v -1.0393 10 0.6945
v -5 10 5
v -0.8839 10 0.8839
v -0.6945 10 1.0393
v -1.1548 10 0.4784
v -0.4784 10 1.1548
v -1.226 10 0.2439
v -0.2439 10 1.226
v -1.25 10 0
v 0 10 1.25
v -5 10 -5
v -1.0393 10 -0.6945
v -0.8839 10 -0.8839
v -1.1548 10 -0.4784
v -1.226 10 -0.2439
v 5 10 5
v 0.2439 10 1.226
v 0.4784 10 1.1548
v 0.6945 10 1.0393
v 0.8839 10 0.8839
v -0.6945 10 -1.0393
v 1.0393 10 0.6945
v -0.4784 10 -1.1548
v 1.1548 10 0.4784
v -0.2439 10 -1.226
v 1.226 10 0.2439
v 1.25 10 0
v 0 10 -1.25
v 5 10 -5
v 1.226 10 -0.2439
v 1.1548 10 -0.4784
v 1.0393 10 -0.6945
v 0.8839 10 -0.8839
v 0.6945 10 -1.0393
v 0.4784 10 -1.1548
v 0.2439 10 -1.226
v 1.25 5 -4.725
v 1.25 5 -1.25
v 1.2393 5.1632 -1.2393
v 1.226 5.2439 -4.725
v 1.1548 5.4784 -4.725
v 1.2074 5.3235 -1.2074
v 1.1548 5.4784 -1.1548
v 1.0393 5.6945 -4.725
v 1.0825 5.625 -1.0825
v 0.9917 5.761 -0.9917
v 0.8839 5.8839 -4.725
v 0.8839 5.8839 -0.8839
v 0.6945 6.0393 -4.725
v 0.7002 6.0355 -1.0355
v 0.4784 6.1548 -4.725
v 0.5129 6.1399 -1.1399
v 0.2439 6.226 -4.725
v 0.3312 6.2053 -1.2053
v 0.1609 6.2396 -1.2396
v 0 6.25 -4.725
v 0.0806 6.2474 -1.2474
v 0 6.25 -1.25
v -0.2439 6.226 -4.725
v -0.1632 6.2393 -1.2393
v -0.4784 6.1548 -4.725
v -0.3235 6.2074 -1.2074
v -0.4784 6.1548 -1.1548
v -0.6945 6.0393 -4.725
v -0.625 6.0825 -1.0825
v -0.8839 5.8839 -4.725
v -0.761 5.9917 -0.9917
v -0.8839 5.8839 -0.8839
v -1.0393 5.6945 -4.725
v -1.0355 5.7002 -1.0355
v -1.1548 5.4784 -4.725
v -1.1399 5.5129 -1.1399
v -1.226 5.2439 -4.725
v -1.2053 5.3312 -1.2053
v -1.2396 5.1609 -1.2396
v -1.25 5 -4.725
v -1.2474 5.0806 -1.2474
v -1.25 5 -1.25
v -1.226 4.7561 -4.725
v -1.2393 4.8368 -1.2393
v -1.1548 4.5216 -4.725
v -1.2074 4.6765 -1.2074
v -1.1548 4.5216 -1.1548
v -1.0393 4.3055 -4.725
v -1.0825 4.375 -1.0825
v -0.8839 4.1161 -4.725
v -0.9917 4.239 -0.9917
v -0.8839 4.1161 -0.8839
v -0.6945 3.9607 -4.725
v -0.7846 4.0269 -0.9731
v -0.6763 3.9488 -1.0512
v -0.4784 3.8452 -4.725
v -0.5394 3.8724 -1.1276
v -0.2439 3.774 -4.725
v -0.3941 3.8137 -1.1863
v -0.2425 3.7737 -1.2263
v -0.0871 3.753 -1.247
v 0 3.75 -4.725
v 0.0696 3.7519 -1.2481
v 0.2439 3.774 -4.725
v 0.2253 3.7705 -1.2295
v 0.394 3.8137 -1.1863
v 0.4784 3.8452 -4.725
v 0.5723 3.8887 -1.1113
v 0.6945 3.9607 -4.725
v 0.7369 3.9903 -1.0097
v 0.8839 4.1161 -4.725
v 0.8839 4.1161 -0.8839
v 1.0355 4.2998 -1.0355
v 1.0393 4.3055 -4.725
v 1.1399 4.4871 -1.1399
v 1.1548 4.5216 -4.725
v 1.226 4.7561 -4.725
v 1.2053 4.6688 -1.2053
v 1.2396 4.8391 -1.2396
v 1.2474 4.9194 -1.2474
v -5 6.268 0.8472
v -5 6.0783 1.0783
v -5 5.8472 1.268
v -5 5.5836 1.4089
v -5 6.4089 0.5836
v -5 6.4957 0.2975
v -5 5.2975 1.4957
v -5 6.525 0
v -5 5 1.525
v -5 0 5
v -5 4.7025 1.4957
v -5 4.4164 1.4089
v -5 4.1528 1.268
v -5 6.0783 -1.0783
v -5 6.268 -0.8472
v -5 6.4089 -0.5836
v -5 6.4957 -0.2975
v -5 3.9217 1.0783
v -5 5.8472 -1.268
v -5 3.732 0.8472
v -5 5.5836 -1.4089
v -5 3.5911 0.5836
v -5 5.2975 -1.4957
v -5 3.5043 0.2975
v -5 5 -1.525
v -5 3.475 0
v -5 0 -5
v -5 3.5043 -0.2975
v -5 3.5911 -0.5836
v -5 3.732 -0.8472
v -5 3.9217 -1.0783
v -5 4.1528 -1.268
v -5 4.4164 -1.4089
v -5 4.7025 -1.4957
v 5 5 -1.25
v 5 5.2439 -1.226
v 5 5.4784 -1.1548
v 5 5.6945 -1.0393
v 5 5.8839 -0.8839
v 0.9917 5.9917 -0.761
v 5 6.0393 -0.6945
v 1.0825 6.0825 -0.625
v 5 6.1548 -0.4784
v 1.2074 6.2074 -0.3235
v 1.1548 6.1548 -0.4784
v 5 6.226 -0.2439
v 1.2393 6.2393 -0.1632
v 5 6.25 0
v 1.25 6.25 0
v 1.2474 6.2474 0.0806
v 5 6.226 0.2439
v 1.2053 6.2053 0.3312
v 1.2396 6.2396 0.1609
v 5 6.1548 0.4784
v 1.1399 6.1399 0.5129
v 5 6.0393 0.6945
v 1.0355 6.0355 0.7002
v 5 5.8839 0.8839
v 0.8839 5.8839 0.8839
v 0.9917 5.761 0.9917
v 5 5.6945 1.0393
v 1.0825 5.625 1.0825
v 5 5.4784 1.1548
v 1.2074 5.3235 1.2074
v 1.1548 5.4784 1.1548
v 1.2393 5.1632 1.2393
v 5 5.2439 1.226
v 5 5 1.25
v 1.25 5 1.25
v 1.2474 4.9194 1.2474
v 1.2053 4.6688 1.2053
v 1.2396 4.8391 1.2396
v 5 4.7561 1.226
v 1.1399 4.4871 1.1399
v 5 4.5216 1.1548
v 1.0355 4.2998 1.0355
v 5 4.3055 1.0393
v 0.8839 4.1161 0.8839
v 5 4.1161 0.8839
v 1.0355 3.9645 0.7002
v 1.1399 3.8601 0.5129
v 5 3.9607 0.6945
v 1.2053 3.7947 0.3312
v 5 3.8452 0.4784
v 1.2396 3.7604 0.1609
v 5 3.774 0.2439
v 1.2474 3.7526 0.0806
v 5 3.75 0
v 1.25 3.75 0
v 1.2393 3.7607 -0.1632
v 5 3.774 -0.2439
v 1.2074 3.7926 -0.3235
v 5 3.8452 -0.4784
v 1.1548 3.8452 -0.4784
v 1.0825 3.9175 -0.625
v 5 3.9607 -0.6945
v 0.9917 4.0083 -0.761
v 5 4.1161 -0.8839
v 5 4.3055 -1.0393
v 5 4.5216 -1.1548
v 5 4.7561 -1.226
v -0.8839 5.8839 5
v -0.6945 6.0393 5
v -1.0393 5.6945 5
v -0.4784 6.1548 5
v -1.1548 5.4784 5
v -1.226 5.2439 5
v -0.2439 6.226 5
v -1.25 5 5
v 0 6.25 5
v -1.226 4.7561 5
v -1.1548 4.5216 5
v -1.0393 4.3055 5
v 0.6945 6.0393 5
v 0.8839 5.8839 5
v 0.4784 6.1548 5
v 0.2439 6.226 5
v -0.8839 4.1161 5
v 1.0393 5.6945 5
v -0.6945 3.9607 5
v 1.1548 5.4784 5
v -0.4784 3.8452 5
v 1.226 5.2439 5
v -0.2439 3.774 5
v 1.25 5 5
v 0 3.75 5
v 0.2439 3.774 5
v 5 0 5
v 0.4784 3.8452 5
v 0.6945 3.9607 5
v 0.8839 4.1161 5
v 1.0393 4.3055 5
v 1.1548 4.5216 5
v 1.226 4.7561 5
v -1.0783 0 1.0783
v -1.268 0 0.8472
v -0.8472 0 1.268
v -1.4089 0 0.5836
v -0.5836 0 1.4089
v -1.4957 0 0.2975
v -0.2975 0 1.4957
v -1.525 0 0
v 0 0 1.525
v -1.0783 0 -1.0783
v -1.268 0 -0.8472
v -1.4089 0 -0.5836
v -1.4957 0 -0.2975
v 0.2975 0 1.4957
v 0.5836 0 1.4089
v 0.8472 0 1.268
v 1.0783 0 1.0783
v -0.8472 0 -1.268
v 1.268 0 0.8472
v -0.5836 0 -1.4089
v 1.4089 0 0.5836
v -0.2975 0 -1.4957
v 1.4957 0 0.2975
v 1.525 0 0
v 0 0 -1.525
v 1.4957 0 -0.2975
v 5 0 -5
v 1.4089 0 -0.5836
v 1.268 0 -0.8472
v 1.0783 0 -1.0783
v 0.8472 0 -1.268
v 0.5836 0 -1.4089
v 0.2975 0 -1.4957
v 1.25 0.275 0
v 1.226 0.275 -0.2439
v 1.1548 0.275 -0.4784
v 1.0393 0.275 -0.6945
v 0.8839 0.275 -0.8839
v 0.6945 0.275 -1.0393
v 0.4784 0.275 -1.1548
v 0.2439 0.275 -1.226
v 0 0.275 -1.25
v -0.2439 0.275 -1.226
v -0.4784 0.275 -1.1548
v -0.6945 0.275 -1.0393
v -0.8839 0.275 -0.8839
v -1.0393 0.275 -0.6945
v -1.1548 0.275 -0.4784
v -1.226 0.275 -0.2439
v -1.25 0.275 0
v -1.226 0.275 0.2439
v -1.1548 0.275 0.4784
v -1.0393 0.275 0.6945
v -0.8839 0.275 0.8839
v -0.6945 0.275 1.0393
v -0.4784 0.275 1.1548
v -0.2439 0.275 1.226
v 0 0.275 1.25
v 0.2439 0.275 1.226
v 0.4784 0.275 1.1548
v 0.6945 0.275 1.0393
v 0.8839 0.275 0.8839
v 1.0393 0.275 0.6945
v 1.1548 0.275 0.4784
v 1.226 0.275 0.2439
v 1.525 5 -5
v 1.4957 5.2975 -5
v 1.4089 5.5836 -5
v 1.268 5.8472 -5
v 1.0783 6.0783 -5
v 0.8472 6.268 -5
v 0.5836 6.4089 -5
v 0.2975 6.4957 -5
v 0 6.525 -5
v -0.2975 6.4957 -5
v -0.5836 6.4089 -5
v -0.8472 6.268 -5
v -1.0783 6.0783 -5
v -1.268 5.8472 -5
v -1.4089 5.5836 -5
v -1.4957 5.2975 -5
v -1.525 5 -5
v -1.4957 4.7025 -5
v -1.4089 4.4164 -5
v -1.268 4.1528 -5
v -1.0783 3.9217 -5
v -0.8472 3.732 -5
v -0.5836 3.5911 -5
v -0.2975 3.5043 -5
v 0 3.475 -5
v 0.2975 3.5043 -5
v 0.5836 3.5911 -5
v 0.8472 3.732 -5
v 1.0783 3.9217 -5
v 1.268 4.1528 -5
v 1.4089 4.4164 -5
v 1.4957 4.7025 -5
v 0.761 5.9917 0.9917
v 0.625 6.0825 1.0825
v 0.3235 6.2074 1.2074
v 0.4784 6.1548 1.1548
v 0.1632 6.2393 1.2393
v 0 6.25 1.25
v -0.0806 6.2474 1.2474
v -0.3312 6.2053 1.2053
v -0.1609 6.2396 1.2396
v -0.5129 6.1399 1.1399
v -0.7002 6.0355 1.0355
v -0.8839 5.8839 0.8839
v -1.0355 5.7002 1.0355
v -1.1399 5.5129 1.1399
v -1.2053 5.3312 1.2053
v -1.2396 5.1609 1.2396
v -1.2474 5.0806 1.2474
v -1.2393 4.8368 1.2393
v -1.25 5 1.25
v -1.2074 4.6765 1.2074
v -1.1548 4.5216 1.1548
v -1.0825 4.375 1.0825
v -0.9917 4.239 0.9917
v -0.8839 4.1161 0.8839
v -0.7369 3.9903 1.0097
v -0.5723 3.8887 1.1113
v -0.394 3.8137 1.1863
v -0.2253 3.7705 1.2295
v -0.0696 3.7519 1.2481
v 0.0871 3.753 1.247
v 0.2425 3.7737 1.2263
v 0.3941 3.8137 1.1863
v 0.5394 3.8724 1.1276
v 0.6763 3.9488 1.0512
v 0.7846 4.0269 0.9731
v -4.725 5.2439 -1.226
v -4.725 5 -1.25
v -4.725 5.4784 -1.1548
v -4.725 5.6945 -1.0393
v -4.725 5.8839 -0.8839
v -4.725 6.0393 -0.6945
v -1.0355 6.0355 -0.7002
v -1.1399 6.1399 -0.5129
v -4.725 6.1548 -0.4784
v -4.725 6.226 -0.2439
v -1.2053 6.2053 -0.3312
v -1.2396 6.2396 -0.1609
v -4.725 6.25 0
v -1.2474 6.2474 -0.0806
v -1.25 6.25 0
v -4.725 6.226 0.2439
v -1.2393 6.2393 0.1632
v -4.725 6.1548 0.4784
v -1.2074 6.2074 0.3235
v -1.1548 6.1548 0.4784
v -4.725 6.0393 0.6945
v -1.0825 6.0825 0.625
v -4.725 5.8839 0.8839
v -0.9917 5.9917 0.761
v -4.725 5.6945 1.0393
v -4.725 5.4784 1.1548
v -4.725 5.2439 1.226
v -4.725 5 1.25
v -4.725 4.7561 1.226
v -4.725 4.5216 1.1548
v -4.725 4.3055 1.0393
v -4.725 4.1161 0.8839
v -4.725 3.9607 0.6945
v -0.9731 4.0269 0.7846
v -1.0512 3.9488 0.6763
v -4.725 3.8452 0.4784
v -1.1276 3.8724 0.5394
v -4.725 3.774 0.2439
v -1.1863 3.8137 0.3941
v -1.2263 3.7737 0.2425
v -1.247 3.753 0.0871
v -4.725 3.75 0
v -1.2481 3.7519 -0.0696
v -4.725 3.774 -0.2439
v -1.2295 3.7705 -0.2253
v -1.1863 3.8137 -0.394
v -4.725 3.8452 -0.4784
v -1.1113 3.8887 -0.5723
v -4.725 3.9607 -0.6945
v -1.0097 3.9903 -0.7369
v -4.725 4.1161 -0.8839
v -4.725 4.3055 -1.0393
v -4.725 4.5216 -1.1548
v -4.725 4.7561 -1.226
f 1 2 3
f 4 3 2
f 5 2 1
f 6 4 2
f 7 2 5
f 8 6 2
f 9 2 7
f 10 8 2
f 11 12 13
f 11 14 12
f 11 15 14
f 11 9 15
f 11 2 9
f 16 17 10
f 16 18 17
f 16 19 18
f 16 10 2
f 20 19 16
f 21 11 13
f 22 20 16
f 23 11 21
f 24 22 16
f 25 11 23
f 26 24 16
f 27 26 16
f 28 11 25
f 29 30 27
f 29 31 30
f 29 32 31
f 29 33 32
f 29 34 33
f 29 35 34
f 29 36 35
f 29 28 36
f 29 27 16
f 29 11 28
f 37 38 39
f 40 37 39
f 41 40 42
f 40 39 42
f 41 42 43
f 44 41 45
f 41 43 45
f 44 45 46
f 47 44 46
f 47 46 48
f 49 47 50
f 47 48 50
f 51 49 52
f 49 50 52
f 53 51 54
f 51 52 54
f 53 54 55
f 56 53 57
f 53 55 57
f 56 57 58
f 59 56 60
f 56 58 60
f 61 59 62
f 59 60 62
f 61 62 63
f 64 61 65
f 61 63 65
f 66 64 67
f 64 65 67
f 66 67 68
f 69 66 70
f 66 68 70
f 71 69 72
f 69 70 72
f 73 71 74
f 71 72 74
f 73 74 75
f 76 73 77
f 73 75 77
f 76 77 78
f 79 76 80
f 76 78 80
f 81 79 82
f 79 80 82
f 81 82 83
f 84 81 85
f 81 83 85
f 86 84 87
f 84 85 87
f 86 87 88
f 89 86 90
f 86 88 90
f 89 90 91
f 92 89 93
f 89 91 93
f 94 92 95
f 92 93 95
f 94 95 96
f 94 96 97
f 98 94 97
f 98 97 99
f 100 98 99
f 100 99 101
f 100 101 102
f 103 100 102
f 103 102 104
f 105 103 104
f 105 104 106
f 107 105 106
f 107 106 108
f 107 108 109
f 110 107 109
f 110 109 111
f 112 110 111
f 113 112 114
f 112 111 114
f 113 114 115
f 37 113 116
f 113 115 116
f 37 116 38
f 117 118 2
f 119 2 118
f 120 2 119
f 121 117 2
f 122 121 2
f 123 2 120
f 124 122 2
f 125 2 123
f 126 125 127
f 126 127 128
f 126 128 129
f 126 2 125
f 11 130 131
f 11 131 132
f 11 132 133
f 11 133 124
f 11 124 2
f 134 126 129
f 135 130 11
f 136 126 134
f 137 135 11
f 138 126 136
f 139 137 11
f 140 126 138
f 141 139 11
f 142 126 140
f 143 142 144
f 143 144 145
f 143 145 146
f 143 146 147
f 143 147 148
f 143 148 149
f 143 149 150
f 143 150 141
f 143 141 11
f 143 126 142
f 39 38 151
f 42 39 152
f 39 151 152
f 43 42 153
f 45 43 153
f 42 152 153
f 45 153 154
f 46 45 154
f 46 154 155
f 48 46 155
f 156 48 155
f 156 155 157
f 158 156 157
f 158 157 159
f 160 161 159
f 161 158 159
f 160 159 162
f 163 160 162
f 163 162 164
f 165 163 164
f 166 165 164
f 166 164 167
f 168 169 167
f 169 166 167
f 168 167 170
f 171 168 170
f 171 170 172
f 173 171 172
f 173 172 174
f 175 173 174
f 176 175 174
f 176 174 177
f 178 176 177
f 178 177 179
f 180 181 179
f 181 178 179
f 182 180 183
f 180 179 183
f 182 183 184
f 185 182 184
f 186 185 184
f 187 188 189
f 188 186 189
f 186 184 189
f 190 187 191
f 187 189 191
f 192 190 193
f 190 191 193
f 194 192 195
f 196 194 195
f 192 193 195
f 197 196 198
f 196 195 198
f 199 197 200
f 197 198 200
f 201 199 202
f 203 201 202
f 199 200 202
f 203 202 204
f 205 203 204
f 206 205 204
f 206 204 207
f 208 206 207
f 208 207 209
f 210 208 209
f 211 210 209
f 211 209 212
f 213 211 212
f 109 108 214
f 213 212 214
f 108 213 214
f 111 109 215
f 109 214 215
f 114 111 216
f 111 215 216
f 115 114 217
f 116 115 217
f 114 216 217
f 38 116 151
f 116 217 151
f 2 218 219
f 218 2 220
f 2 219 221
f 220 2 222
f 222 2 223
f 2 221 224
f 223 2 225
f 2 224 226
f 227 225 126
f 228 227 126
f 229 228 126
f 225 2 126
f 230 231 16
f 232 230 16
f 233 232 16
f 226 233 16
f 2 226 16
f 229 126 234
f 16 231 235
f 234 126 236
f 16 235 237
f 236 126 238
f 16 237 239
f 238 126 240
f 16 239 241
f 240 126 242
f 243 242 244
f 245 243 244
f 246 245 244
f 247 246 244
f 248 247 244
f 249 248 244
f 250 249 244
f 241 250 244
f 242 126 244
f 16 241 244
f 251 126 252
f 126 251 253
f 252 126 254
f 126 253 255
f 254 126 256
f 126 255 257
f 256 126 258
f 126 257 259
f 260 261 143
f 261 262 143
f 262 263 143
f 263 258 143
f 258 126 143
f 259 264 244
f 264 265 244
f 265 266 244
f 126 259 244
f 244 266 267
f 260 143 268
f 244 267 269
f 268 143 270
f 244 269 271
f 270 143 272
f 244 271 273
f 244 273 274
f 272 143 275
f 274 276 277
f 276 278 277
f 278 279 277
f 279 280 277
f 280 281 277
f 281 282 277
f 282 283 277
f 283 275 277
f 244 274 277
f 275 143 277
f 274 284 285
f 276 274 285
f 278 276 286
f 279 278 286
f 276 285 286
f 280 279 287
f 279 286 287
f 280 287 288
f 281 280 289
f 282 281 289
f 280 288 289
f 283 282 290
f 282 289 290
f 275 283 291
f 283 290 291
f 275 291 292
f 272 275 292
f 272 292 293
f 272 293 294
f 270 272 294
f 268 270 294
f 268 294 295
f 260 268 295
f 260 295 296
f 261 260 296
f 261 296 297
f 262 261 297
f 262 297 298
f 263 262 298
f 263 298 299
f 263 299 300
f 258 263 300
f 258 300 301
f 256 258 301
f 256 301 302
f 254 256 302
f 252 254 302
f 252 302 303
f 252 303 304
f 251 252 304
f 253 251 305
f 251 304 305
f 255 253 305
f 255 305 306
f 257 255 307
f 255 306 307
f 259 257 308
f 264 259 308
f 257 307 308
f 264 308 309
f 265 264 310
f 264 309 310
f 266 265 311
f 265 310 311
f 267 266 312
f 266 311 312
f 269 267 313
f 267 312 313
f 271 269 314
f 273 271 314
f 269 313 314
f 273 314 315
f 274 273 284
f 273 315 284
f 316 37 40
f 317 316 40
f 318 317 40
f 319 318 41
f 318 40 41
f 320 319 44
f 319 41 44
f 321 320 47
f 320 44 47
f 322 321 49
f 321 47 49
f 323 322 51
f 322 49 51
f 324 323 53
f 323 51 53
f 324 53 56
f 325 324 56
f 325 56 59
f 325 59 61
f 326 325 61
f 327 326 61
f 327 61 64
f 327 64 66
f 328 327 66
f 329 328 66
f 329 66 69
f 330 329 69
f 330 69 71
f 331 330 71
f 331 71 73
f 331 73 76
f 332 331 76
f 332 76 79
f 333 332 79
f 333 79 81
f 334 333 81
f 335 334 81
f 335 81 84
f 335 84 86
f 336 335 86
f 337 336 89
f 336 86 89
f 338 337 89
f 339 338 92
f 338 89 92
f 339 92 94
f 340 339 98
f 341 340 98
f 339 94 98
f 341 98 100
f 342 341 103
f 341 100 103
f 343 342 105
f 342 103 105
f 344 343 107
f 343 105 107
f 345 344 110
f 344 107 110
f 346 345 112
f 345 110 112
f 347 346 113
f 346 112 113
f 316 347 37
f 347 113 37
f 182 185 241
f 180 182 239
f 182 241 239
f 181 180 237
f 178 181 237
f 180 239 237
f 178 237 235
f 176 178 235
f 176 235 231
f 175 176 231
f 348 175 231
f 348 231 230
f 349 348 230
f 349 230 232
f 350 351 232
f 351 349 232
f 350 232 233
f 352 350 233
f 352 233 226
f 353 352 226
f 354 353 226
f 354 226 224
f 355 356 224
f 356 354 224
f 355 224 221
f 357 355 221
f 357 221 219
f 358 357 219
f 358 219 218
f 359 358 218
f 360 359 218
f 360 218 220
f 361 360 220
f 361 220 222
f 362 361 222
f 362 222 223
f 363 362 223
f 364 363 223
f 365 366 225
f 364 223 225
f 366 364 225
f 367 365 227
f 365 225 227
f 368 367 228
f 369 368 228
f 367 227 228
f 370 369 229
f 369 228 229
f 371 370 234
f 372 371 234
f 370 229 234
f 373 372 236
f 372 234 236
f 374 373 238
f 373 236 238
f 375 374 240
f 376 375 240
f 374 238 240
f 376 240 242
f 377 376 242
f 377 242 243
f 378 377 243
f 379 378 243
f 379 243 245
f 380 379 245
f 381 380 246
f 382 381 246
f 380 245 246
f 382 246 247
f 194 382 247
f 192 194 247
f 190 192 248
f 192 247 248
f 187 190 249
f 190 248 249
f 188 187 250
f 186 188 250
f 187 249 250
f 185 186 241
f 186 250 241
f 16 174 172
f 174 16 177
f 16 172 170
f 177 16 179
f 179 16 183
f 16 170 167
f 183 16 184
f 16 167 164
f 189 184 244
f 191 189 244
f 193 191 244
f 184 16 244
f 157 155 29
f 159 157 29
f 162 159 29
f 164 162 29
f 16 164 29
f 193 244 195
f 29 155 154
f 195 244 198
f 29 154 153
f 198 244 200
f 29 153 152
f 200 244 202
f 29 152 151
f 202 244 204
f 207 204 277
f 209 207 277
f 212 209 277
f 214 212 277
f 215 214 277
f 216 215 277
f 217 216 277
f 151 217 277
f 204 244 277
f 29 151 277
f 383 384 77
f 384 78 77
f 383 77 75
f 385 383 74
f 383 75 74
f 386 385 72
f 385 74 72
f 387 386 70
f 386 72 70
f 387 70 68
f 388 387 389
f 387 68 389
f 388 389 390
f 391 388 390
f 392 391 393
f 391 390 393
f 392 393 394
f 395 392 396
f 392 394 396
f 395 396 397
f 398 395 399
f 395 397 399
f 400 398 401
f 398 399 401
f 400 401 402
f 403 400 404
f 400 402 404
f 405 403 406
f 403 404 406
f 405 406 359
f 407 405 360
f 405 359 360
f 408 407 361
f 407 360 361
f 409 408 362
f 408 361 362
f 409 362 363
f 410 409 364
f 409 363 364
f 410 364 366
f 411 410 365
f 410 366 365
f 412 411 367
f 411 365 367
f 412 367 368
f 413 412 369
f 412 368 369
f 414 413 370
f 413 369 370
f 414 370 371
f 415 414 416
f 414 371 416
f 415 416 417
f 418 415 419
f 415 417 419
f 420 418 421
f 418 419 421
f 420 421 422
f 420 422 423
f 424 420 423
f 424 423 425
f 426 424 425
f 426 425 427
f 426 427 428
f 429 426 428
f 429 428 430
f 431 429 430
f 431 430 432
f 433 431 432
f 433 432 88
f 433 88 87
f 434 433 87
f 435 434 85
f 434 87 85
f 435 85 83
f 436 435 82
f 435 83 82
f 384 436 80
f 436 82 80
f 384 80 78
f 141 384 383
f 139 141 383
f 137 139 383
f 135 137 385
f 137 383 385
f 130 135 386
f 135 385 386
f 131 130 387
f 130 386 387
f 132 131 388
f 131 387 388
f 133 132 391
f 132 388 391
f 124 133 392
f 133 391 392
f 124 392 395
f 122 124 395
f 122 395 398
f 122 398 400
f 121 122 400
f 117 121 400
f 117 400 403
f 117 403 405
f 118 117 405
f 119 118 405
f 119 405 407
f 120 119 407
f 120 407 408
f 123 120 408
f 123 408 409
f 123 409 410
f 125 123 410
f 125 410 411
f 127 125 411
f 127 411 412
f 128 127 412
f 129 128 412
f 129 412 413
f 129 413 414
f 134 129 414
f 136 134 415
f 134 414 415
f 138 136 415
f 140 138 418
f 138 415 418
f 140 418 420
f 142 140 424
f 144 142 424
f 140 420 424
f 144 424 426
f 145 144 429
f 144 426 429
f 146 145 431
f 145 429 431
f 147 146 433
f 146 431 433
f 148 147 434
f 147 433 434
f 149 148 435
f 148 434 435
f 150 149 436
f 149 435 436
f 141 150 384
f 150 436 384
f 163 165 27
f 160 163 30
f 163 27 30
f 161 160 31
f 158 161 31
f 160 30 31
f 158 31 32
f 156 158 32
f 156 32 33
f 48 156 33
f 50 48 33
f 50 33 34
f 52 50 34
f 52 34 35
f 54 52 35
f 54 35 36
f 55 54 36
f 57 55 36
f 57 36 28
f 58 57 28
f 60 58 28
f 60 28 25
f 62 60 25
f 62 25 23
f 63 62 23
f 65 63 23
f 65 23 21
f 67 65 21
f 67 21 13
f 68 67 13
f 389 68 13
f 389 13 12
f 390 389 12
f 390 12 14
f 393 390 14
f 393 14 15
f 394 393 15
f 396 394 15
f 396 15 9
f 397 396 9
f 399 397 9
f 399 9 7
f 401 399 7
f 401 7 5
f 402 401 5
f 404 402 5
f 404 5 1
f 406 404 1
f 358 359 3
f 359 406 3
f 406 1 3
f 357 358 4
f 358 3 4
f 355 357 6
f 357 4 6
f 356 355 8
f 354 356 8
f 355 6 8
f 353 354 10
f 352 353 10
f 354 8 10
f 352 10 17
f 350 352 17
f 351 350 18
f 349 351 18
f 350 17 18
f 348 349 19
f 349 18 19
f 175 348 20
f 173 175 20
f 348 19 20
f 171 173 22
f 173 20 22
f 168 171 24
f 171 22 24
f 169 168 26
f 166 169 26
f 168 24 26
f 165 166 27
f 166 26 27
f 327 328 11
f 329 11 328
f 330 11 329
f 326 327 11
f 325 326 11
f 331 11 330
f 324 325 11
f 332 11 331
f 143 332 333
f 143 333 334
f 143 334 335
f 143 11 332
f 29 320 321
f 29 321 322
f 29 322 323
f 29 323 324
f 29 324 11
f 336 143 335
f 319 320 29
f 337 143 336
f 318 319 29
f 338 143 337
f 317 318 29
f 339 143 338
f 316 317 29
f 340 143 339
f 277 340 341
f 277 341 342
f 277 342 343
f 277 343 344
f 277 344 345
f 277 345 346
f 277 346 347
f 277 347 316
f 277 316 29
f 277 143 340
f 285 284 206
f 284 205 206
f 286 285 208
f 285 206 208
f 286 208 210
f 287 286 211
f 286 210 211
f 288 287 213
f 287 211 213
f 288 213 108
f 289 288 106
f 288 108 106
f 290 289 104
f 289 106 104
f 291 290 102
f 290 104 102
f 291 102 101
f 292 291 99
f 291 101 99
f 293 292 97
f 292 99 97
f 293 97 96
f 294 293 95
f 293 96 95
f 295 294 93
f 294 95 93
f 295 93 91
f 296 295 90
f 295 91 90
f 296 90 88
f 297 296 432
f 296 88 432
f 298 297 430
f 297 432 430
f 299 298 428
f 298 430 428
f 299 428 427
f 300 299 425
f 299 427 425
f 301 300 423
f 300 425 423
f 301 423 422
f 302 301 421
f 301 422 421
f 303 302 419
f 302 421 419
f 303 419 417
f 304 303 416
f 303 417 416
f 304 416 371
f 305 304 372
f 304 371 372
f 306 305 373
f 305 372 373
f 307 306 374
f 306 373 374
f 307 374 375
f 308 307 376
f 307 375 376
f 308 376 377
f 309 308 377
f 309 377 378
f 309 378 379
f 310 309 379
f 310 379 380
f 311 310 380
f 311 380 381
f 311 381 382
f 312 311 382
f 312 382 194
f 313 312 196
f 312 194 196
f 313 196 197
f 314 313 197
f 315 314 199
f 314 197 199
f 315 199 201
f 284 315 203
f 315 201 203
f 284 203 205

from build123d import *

# Parameters (mm, degrees)
SKETCH_1_W                   = 10
SKETCH_1_H                   = 10
EXTRUDE_1_DEPTH              = 10
HOLE_WIZARD_M3_1_D           = 2.5
HOLE_WIZARD_M3_1_CSINK_D     = 3.05
HOLE_WIZARD_M3_1_CSINK_ANGLE = 90
HOLE_WIZARD_M3_2_D           = 2.5
HOLE_WIZARD_M3_2_CSINK_D     = 3.05
HOLE_WIZARD_M3_2_CSINK_ANGLE = 90
HOLE_WIZARD_M3_3_D           = 2.5
HOLE_WIZARD_M3_3_CSINK_D     = 3.05
HOLE_WIZARD_M3_3_CSINK_ANGLE = 90


with BuildPart() as part:
    # 草图1 → 凸台-拉伸1 (new body)
    with BuildSketch(Plane(origin=(0, 0, 0), x_dir=(1, 0, 0), z_dir=(0, 1, 0))):
        Rectangle(SKETCH_1_W, SKETCH_1_H)
    extrude(amount=EXTRUDE_1_DEPTH)

    # M3 螺纹孔1 (through all)
    with Locations(Plane(origin=(0, 0, 0), x_dir=(-1, 0, 0), z_dir=(0, -1, 0))):
        with Locations((0, 0)):
            CounterSinkHole(HOLE_WIZARD_M3_1_D / 2, HOLE_WIZARD_M3_1_CSINK_D / 2, counter_sink_angle=HOLE_WIZARD_M3_1_CSINK_ANGLE)

    # M3 螺纹孔2 (through all)
    with Locations(Plane(origin=(0, 0, -5), x_dir=(-1, 0, 0), z_dir=(0, 0, -1))):
        with Locations((0, 5)):
            CounterSinkHole(HOLE_WIZARD_M3_2_D / 2, HOLE_WIZARD_M3_2_CSINK_D / 2, counter_sink_angle=HOLE_WIZARD_M3_2_CSINK_ANGLE)

    # M3 螺纹孔3 (through all)
    with Locations(Plane.ZY.offset(5)):
        with Locations((0, 5)):
            CounterSinkHole(HOLE_WIZARD_M3_3_D / 2, HOLE_WIZARD_M3_3_CSINK_D / 2, counter_sink_angle=HOLE_WIZARD_M3_3_CSINK_ANGLE)


solid = part.part
